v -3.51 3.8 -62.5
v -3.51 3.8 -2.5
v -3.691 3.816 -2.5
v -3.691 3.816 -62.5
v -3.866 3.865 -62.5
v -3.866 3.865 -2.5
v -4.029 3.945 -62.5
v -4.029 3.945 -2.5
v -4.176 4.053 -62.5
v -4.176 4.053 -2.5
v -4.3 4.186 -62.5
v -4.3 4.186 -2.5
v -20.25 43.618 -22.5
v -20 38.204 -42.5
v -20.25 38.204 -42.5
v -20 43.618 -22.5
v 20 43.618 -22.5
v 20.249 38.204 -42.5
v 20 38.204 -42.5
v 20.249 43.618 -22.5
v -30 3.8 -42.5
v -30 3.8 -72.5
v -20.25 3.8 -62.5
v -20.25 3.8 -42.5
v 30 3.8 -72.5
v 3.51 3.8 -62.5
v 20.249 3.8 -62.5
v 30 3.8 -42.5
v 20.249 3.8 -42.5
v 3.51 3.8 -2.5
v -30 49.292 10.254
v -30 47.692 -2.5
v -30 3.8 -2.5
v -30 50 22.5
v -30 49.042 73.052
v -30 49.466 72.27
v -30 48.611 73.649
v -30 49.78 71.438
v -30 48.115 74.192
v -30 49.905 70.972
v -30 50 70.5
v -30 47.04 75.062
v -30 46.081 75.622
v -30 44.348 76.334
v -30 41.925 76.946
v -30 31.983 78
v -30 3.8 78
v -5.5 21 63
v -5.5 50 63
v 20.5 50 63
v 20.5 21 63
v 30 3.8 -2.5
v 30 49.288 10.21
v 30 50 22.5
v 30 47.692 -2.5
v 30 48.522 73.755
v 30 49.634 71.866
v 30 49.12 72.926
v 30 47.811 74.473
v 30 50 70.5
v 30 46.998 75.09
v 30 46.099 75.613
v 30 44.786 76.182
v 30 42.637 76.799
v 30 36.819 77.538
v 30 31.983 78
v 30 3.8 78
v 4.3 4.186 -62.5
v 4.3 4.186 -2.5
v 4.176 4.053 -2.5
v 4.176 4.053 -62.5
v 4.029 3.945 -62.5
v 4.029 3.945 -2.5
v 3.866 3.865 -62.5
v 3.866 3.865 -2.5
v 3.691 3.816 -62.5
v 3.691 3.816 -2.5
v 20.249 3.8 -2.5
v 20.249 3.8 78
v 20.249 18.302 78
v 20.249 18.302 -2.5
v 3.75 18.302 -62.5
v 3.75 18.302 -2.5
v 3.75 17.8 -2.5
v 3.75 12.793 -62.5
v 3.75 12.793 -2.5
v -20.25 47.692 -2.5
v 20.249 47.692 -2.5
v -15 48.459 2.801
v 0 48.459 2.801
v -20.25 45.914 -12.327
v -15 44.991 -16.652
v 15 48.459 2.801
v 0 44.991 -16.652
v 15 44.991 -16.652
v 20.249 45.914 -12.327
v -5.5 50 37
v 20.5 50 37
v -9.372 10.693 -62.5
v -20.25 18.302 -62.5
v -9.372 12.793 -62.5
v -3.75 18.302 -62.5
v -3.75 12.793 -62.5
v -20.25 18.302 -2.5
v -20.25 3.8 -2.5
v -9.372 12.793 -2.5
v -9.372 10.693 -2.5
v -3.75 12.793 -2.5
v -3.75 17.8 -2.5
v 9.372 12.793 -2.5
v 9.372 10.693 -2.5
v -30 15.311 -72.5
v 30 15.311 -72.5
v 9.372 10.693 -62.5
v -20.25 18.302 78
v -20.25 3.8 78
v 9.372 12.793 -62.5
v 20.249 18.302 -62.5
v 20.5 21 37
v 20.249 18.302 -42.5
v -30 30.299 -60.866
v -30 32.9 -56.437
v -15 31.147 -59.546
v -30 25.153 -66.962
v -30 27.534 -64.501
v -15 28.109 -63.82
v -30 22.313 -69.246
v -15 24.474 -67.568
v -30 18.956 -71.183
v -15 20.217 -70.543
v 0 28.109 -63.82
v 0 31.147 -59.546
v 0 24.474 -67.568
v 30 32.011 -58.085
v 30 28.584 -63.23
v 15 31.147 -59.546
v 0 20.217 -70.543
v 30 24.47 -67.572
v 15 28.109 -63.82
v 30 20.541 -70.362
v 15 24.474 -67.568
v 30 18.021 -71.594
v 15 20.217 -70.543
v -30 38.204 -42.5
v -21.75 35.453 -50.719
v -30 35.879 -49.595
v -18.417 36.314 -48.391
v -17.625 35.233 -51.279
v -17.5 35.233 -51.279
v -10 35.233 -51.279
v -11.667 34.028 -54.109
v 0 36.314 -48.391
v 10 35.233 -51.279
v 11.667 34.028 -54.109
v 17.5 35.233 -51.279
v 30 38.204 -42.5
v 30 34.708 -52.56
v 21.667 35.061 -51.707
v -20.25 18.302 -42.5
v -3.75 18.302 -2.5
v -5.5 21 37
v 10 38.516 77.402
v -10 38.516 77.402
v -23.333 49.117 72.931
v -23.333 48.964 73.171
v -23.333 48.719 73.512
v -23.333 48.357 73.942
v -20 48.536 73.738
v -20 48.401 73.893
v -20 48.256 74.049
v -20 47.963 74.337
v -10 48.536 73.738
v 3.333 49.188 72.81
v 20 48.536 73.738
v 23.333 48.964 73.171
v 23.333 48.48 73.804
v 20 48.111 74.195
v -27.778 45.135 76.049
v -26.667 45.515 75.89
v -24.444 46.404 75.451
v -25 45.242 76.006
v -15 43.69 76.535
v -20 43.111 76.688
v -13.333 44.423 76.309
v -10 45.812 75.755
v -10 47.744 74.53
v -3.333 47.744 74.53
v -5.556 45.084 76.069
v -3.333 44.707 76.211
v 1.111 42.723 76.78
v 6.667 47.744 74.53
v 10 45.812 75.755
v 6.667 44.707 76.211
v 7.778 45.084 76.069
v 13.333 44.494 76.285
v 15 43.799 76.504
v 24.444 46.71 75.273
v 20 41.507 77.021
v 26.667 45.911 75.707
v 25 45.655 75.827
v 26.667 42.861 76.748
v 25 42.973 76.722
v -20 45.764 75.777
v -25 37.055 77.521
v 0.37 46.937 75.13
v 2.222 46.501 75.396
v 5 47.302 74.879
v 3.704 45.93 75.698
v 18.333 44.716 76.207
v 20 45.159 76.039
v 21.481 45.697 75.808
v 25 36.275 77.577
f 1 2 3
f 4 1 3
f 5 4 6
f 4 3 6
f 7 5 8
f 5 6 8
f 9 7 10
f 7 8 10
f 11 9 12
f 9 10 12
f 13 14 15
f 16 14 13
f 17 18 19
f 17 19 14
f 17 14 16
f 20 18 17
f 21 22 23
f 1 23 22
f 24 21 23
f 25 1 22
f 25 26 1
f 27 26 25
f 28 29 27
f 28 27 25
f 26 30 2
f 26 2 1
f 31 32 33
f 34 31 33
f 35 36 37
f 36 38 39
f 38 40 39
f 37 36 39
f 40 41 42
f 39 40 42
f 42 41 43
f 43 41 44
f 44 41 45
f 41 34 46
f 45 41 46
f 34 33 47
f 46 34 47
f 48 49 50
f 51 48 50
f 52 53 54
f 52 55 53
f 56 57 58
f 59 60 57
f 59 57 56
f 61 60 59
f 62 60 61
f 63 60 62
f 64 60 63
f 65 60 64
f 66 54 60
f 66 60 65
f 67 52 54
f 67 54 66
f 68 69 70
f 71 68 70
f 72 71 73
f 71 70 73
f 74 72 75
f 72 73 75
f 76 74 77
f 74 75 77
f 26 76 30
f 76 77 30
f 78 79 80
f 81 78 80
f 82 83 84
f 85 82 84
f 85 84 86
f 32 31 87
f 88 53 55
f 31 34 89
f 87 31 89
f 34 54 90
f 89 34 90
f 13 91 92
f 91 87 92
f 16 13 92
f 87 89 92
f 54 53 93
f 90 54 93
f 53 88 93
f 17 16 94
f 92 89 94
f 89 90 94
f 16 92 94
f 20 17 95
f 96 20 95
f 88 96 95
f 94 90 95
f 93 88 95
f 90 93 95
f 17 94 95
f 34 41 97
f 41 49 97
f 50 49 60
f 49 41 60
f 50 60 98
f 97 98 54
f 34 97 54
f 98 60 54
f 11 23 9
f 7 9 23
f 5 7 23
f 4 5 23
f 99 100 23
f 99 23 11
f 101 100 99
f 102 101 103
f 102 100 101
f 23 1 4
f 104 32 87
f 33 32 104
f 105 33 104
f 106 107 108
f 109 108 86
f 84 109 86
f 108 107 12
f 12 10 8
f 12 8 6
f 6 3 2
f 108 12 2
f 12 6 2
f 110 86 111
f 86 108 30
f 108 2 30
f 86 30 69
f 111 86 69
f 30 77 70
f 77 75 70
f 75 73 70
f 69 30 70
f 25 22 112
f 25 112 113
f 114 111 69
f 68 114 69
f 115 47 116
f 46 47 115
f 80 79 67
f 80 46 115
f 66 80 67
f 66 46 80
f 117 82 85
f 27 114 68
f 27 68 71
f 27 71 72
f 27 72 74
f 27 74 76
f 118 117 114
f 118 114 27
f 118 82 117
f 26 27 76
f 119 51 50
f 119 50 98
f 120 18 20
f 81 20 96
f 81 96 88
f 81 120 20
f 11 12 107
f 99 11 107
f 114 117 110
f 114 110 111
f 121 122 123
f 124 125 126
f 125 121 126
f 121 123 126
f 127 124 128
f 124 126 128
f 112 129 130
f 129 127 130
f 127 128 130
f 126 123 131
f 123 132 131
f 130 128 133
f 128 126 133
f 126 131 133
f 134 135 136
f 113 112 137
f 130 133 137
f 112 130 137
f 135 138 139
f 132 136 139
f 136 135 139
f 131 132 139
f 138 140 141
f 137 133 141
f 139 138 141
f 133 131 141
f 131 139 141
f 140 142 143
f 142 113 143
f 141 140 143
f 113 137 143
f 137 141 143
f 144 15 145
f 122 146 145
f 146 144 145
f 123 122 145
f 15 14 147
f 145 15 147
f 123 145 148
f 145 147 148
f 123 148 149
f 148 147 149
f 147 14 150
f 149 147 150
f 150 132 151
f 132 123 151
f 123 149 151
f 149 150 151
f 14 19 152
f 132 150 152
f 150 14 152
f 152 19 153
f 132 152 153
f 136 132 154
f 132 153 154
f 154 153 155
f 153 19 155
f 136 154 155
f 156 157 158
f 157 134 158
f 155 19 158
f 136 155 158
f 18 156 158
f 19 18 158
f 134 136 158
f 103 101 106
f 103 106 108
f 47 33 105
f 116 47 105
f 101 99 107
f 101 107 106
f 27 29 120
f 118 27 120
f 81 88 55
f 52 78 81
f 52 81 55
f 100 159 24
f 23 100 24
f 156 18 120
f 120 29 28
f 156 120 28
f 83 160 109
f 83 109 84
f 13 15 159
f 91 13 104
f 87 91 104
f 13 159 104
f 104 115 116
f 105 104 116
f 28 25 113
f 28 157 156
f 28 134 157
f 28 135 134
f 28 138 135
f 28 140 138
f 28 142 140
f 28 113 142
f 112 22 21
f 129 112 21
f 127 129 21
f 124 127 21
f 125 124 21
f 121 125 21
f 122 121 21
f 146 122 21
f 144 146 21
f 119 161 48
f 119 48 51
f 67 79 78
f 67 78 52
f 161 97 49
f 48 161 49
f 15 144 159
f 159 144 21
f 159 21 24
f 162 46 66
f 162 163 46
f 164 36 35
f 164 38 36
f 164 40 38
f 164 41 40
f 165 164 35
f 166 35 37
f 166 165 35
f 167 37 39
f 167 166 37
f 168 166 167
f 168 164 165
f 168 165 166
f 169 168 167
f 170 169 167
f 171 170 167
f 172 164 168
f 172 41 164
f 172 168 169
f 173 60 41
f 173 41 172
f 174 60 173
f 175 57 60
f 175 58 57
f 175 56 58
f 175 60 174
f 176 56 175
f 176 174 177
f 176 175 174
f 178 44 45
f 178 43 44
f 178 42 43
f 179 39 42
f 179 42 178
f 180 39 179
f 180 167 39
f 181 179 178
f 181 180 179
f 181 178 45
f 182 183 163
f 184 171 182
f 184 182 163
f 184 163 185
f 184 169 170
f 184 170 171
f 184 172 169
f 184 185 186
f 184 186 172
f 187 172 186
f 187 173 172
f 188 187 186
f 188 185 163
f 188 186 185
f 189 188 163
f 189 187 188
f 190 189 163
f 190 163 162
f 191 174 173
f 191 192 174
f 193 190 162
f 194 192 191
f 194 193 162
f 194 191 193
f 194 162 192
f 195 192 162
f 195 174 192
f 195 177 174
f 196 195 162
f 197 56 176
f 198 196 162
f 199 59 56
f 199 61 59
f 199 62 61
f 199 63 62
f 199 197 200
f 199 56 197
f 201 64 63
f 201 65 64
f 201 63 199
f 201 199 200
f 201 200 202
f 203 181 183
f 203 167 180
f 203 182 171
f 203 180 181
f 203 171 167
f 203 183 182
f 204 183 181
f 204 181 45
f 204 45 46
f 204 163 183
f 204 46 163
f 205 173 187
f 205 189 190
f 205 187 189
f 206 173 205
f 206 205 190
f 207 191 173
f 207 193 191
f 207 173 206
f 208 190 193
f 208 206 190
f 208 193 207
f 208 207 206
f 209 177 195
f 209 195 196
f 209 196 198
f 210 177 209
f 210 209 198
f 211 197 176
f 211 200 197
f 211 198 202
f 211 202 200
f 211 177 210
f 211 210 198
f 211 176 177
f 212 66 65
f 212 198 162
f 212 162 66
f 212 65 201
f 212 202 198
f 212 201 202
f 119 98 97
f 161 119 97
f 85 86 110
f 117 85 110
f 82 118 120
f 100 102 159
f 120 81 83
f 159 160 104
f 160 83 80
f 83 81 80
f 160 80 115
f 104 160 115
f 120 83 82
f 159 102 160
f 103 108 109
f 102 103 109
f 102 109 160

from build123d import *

# Parameters (mm, degrees)
SKETCH_1_W                = 100
SKETCH_1_H                = 185
EXTRUDE_1_DEPTH           = 100
SKETCH_2_W                = 100
SKETCH_2_H                = 3.8
CUT_EXTRUDE_1_DEPTH       = 155
CUT_EXTRUDE_2_DEPTH       = 155
SKETCH_4_W                = 25.5
SKETCH_4_H                = 25.5
CUT_EXTRUDE_3_DEPTH       = 79
SKETCH_6_W                = 89.706259743
SKETCH_6_H                = 10
SKETCH_6_W_2              = 10.293740257
CUT_EXTRUDE_4_DEPTH       = 146.107718609
CUT_EXTRUDE_5_DEPTH       = 169.985946161
CUT_EXTRUDE_5_DEPTH_BACK  = 169.985946161
SKETCH_7_W                = 20
SKETCH_7_H                = 3.8
EXTRUDE_4_DEPTH           = 160
SKETCH_10_W               = 16
SKETCH_10_H               = 1.8
CUT_EXTRUDE_6_DEPTH       = 155
SKETCH_13_W               = 20
SKETCH_13_H               = 175
CUT_EXTRUDE_7_DEPTH       = 143.515578096
SKETCH_14_W               = 175
SKETCH_14_H               = 50
CUT_EXTRUDE_8_DEPTH       = 149.849756466
SKETCH_15_W               = 60
SKETCH_15_H               = 10
CUT_EXTRUDE_9_DEPTH       = 108.660066877
SKETCH_16_W               = 60
SKETCH_16_H               = 14.5
CUT_EXTRUDE_10_DEPTH      = 108.660066877
CUT_EXTRUDE_11_DEPTH      = 111.381157812
CUT_EXTRUDE_21_DEPTH      = 162.400898529
CUT_EXTRUDE_21_DEPTH_BACK = 140.5
CUT_EXTRUDE_26_DEPTH      = 111.381157983
SKETCH_34_W               = 10
SKETCH_34_H               = 20
CUT_EXTRUDE_31_DEPTH      = 96.490523251
SKETCH_35_W               = 18.74373947
SKETCH_35_H               = 80.5
CUT_EXTRUDE_32_DEPTH      = 14
CUT_EXTRUDE_35_DEPTH      = 60
CUT_EXTRUDE_36_DEPTH      = 140.5
SKETCH_43_W               = 0.25
SKETCH_43_H               = 0.002112168
CUT_EXTRUDE_37_DEPTH      = 140.5
SKETCH_44_W               = 7.5
SKETCH_44_H               = 0.502112168
CUT_EXTRUDE_38_DEPTH      = 80.4999
SKETCH_45_W               = 9.75
SKETCH_45_H               = 20
SKETCH_45_W_2             = 9.75146362
CUT_EXTRUDE_39_DEPTH      = 96.490523251
SKETCH_46_W               = 0.24853638
SKETCH_46_H               = 20
SKETCH_46_W_2             = 0.25
EXTRUDE_5_DEPTH           = 31.697888
CUT_EXTRUDE_40_DEPTH      = 106.399537724
CUT_EXTRUDE_40_DEPTH_BACK = 106.399537724
SKETCH_54_W               = 25.5
SKETCH_54_H               = 0.5
CUT_EXTRUDE_41_DEPTH      = 29


with BuildPart() as part:
    # 草图1 → 凸台-拉伸1 (new body)
    with BuildSketch(Plane(origin=(0, 0, 0), x_dir=(1, 0, 0), z_dir=(0, 1, 0))):
        Rectangle(SKETCH_1_W, SKETCH_1_H)
    extrude(amount=EXTRUDE_1_DEPTH)

    # 草图2 → 切除-拉伸1 (cut)
    with BuildSketch(Plane.XY.offset(92.5)):
        with Locations((0, 1.9)):
            Rectangle(SKETCH_2_W, SKETCH_2_H)
    extrude(amount=-CUT_EXTRUDE_1_DEPTH, mode=Mode.SUBTRACT)

    # 草图3 → 切除-拉伸2 (cut)
    with BuildSketch(Plane.XY.offset(92.5)):
        with BuildLine():
            Line((-20, 3.8), (-3.51, 3.8))
            ThreePointArc((-3.51, 3.8), (-3.949598778, 3.901619975), (-4.3, 4.185860522))
            Line((-4.3, 4.185860522), (-9.371869735, 10.69267521))
            ThreePointArc((-9.371869735, 10.69267521), (-9.267749528, 11.143089764), (-8.9765156, 11.502112168))
            Line((-8.9765156, 11.502112168), (-4.5, 11.502112168))
            ThreePointArc((-4.5, 11.502112168), (-4.146446609, 11.648558777), (-4, 12.002112168))
            Line((-4, 12.002112168), (-4, 16.002112168))
            Line((-4, 16.002112168), (-20, 16.002112168))
            Line((-20, 16.002112168), (-20, 3.8))
        make_face()
        with BuildLine():
            ThreePointArc((4.3, 4.185860522), (3.949598778, 3.901619975), (3.51, 3.8))
            Line((3.51, 3.8), (20, 3.8))
            Line((20, 3.8), (20, 16.002112168))
            Line((20, 16.002112168), (4, 16.002112168))
            Line((4, 16.002112168), (4, 12.002112168))
            ThreePointArc((4, 12.002112168), (4.146446609, 11.648558777), (4.5, 11.502112168))
            Line((4.5, 11.502112168), (8.9765156, 11.502112168))
            ThreePointArc((8.9765156, 11.502112168), (9.426930154, 11.220838522), (9.371869735, 10.69267521))
            Line((9.371869735, 10.69267521), (4.3, 4.185860522))
        make_face()
    extrude(amount=-CUT_EXTRUDE_2_DEPTH, mode=Mode.SUBTRACT)

    # 草图4 → 切除-拉伸3 (cut)
    with BuildSketch(Plane(origin=(0, 100, 0), x_dir=(1, 0, 0), z_dir=(0, 1, 0))):
        with Locations((7.75, -50.25)):
            Rectangle(SKETCH_4_W, SKETCH_4_H)
    extrude(amount=-CUT_EXTRUDE_3_DEPTH, mode=Mode.SUBTRACT)

    # 草图6 → 切除-拉伸4 (cut, through all)
    with BuildSketch(Plane(origin=(0, 100, 0), x_dir=(1, 0, 0), z_dir=(0, 1, 0))):
        with Locations((5.146870128, 87.5)):
            Rectangle(SKETCH_6_W, SKETCH_6_H)
        with Locations((-44.853129872, 87.5)):
            Rectangle(SKETCH_6_W_2, SKETCH_6_H)
    extrude(amount=-CUT_EXTRUDE_4_DEPTH, mode=Mode.SUBTRACT)

    # 草图7 → 切除-拉伸5 (cut, two sides: drawn at the far end of the back side and taken through both)
    with BuildSketch(Plane.ZY.offset(50).offset(-CUT_EXTRUDE_5_DEPTH_BACK)):
        with Locations((-72.5, 1.9)):
            Rectangle(SKETCH_7_W, SKETCH_7_H)
    extrude(amount=CUT_EXTRUDE_5_DEPTH + CUT_EXTRUDE_5_DEPTH_BACK, mode=Mode.SUBTRACT)

    # 草图9 → 凸台-拉伸4 (add)
    with BuildSketch(Plane.XY.offset(92.5)):
        Polygon((-9.371869735, 10.69267521), (-9.371869735, 13.29267521), (-4, 13.29267521), (4, 13.29267521), (9.371869735, 13.29267521), (9.371869735, 10.69267521), align=None)
    extrude(amount=-EXTRUDE_4_DEPTH)

    # 草图10 → 切除-拉伸6 (cut)
    with BuildSketch(Plane.XY.offset(92.5)):
        with Locations((-12, 16.902112168)):
            Rectangle(SKETCH_10_W, SKETCH_10_H)
        Polygon((4, 16.002112168), (4, 17.802112168), (19.99853638, 17.802112168), (20, 16.002112168), align=None)
    extrude(amount=-CUT_EXTRUDE_6_DEPTH, mode=Mode.SUBTRACT)

    # 草图13 → 切除-拉伸7 (cut, through all)
    with BuildSketch(Plane.XZ.offset(-3.8)):
        with Locations((-40, 5)):
            Rectangle(SKETCH_13_W, SKETCH_13_H)
        with Locations((40, 5)):
            Rectangle(SKETCH_13_W, SKETCH_13_H)
    extrude(amount=-CUT_EXTRUDE_7_DEPTH, mode=Mode.SUBTRACT)

    # 草图14 → 切除-拉伸8 (cut, through all)
    with BuildSketch(Plane(origin=(30, 0, 0), x_dir=(0, 0, -1), z_dir=(1, 0, 0))):
        with Locations((-5, 75)):
            Rectangle(SKETCH_14_W, SKETCH_14_H)
    extrude(amount=-CUT_EXTRUDE_8_DEPTH, mode=Mode.SUBTRACT)

    # 草图15 → 切除-拉伸9 (cut, through all)
    with BuildSketch(Plane.XZ.offset(-3.8)):
        with Locations((0, -77.5)):
            Rectangle(SKETCH_15_W, SKETCH_15_H)
    extrude(amount=-CUT_EXTRUDE_9_DEPTH, mode=Mode.SUBTRACT)

    # 草图16 → 切除-拉伸10 (cut, through all)
    with BuildSketch(Plane(origin=(0, 50, 0), x_dir=(1, 0, 0), z_dir=(0, 1, 0))):
        with Locations((0, -85.25)):
            Rectangle(SKETCH_16_W, SKETCH_16_H)
    extrude(amount=-CUT_EXTRUDE_10_DEPTH, mode=Mode.SUBTRACT)

    # 草图17 → 切除-拉伸11 (cut, through all)
    with BuildSketch(Plane(origin=(30, 0, 0), x_dir=(0, 0, -1), z_dir=(1, 0, 0))):
        with BuildLine():
            Line((72.5, 50), (-22.5, 50))
            add(Edge.make_bspline(
                [(-22.5, 50), (-9.330669895, 49.706144403), (11.085821801, 46.827148239), (38.239751221, 39.498978447), (59.688603115, 33.272875951), (70.679662454, 22.295526596), (72.5, 15.311284203)],
                knots=[0, 0, 0, 0, 0.374533404, 0.581855131, 0.802431491, 1, 1, 1, 1], degree=3))
            Line((72.5, 15.311284203), (72.5, 50))
        make_face()
    extrude(amount=-CUT_EXTRUDE_11_DEPTH, mode=Mode.SUBTRACT)

    # 草图24 → 切除-拉伸21 (cut, two sides: drawn at the far end of the back side and taken through both)
    with BuildSketch(Plane.XY.offset(78).offset(-CUT_EXTRUDE_21_DEPTH_BACK)):
        with BuildLine():
            Line((9.371869735, 11.309008937), (9.371869735, 10.69267521))
            ThreePointArc((9.371869735, 10.69267521), (9.477785695, 11.000842073), (9.371869735, 11.309008937))
        make_face()
    extrude(amount=CUT_EXTRUDE_21_DEPTH + CUT_EXTRUDE_21_DEPTH_BACK, mode=Mode.SUBTRACT)

    # 草图28 → 切除-拉伸26 (cut, through all)
    with BuildSketch(Plane(origin=(30, 0, 0), x_dir=(0, 0, -1), z_dir=(1, 0, 0))):
        with BuildLine():
            Line((-70.5, 50), (-78, 50))
            Line((-78, 50), (-78, 31.982866201))
            add(Edge.make_bspline(
                [(-70.5, 50), (-78.410932033, 48.656434308), (-77.0737544, 36.843285786), (-78, 31.982866201)],
                knots=[0, 0, 0, 0, 1, 1, 1, 1], degree=3))
        make_face()
    extrude(amount=-CUT_EXTRUDE_26_DEPTH, mode=Mode.SUBTRACT)

    # 草图34 → 切除-拉伸31 (cut, through all)
    with BuildSketch(Plane.XZ.offset(-3.8)):
        with Locations((-25, -32.5)):
            Rectangle(SKETCH_34_W, SKETCH_34_H)
        with Locations((25, -32.5)):
            Rectangle(SKETCH_34_W, SKETCH_34_H)
    extrude(amount=-CUT_EXTRUDE_31_DEPTH, mode=Mode.SUBTRACT)

    # 草图35 → 切除-拉伸32 (cut)
    with BuildSketch(Plane.XZ.offset(-3.8)):
        with Locations((0, 37.75)):
            Rectangle(SKETCH_35_W, SKETCH_35_H)
    extrude(amount=-CUT_EXTRUDE_32_DEPTH, mode=Mode.SUBTRACT)

    # 草图40 → 切除-拉伸35 (cut)
    with BuildSketch(Plane.XY.offset(-2.5)):
        Polygon((4, 13.29267521), (4, 17.8), (3.75, 17.8), (3.75, 12.79267521), (9.371869735, 12.79267521), (9.371869735, 13.29267521), align=None)
        Polygon((-3.75, 17.8), (-4, 17.8), (-4, 13.29267521), (-9.371869735, 13.29267521), (-9.371869735, 12.79267521), (-3.75, 12.79267521), align=None)
    extrude(amount=-CUT_EXTRUDE_35_DEPTH, mode=Mode.SUBTRACT)

    # 草图41 → 切除-拉伸36 (cut)
    with BuildSketch(Plane.XY.offset(78)):
        Polygon((-3.75, 18.302112168), (-20.25, 18.302112168), (-20.25, 3.8), (-20, 3.8), (-20, 17.802112168), (-3.75, 17.802112168), align=None)
        Polygon((3.75, 18.302112168), (3.75, 17.802112168), (19.99853638, 17.802112168), (19.99853638, 3.8), (20.24853638, 3.8), (20.24853638, 18.302112168), align=None)
    extrude(amount=-CUT_EXTRUDE_36_DEPTH, mode=Mode.SUBTRACT)

    # 草图43 → 切除-拉伸37 (cut)
    with BuildSketch(Plane.XY.offset(78)):
        with Locations((-3.875, 17.801056084)):
            Rectangle(SKETCH_43_W, SKETCH_43_H)
        with Locations((3.875, 17.801056084)):
            Rectangle(SKETCH_43_W, SKETCH_43_H)
    extrude(amount=-CUT_EXTRUDE_37_DEPTH, mode=Mode.SUBTRACT)

    # 草图44 → 切除-拉伸38 (cut)
    with BuildSketch(Plane.XY.offset(78)):
        with Locations((0, 18.051056084)):
            Rectangle(SKETCH_44_W, SKETCH_44_H)
    extrude(amount=-CUT_EXTRUDE_38_DEPTH, mode=Mode.SUBTRACT)

    # 草图45 → 切除-拉伸39 (cut, through all)
    with BuildSketch(Plane.XZ.offset(-3.8)):
        with Locations((-25.125, -12.5)):
            Rectangle(SKETCH_45_W, SKETCH_45_H)
        with Locations((25.12426819, -12.5)):
            Rectangle(SKETCH_45_W_2, SKETCH_45_H)
    extrude(amount=-CUT_EXTRUDE_39_DEPTH, mode=Mode.SUBTRACT)

    # 草图46 → 凸台-拉伸5 (add, through all)
    with BuildSketch(Plane.XZ.offset(-18.302112168)):
        with Locations((20.12426819, -32.5)):
            Rectangle(SKETCH_46_W, SKETCH_46_H)
        with Locations((-20.125, -32.5)):
            Rectangle(SKETCH_46_W_2, SKETCH_46_H)
    extrude(amount=-EXTRUDE_5_DEPTH)

    # 草图47 → 切除-拉伸40 (cut, two sides: drawn at the far end of the back side and taken through both)
    with BuildSketch(Plane.ZY.offset(20.25).offset(-CUT_EXTRUDE_40_DEPTH_BACK)):
        Polygon((-42.5, 38.203961841), (-22.5, 43.618048783), (-22.5, 50), (-42.5, 50), align=None)
    extrude(amount=CUT_EXTRUDE_40_DEPTH + CUT_EXTRUDE_40_DEPTH_BACK, mode=Mode.SUBTRACT)

    # 草图54 → 切除-拉伸41 (cut)
    with BuildSketch(Plane(origin=(0, 50, 0), x_dir=(1, 0, 0), z_dir=(0, 1, 0))):
        with Locations((7.75, -37.25)):
            Rectangle(SKETCH_54_W, SKETCH_54_H)
        Polygon((-5, -63), (-5, -37.5), (-5, -37), (-5.5, -37), (-5.5, -63), align=None)
    extrude(amount=-CUT_EXTRUDE_41_DEPTH, mode=Mode.SUBTRACT)


solid = part.part
